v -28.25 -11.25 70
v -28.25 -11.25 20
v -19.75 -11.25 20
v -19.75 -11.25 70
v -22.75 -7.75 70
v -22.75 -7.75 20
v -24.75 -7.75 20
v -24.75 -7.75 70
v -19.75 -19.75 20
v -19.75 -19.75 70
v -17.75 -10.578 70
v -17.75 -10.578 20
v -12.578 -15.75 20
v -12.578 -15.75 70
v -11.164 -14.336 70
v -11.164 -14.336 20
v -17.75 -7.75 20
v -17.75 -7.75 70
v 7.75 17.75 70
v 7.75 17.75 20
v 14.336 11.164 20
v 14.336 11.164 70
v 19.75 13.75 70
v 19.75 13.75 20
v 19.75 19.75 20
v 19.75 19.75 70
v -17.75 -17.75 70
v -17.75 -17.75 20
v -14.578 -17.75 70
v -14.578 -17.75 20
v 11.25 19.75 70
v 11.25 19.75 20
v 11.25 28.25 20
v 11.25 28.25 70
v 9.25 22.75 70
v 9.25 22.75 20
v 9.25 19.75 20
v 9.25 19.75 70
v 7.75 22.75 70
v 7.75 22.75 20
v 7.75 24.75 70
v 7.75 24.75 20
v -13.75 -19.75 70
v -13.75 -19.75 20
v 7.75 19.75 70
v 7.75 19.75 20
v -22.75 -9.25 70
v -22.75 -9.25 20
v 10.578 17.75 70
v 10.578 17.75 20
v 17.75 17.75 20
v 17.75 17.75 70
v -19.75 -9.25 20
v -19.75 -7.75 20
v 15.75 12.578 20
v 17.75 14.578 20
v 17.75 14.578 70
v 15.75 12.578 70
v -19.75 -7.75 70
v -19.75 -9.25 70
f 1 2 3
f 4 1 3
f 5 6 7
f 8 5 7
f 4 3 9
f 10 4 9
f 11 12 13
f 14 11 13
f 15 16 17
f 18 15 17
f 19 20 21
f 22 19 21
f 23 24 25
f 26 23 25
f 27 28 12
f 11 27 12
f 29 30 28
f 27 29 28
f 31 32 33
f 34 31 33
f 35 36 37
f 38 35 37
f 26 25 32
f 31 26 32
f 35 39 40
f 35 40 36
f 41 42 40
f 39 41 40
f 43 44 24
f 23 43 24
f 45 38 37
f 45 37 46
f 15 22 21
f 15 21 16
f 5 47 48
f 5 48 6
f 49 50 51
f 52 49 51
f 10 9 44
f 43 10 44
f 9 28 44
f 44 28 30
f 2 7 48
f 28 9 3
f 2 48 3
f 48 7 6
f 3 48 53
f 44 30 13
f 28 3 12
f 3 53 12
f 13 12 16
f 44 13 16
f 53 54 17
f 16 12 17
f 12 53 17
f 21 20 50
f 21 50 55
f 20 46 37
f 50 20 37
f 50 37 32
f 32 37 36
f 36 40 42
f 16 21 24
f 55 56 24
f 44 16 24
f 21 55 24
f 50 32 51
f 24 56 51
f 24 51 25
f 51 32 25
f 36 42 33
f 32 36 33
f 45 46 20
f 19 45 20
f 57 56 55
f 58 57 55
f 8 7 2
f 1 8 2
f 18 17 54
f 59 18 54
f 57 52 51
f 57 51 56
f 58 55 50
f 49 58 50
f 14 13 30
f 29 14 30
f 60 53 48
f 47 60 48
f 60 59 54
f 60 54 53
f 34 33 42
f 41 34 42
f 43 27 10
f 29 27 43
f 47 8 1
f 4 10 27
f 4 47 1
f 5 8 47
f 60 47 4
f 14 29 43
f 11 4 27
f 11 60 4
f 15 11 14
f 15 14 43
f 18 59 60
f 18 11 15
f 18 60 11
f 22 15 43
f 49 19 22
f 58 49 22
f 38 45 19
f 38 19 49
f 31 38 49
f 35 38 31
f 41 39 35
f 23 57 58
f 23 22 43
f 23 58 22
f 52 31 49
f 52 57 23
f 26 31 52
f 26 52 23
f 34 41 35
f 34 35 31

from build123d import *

# Parameters (mm, degrees)
F1_DEPTH = 20
F3_DEPTH = 50
F5_DEPTH = 20


with BuildPart() as f1:
    # F0 (on Top) → F1 (new body)
    with BuildSketch(Plane.XY):
        Polygon((-19.75, -17.7500005811), (-19.75, -19.75), (-13.75, -19.75), (19.75, 13.75), (19.75, 19.75), (17.7500005811, 19.75), (17.7500005811, 14.578426884), (-14.578426884, -17.7500005811), align=None)
    extrude(amount=F1_DEPTH)

    # F2 (on face) → F3 (join)
    with BuildSketch(Plane.XY.offset(20)):
        Polygon((-19.75, -19.75), (-13.75, -19.75), (19.75, 13.75), (19.75, 19.75), (11.25, 19.75), (11.25, 28.25), (7.75, 24.75), (7.75, 22.75), (9.25, 22.75), (9.25, 19.7500005811), (7.75, 19.7500005811), (7.75, 17.7500005811), (14.3357871391, 11.164213442), (-11.164213442, -14.3357871391), (-17.7500005811, -7.75), (-19.7500005811, -7.75), (-19.7500005811, -9.25), (-22.75, -9.25), (-22.75, -7.75), (-24.75, -7.75), (-28.25, -11.25), (-19.75, -11.25), align=None)
        Polygon((-14.578426884, -17.7500005811), (-17.7500005811, -17.7500005811), (-17.7500005811, -10.5784263029), (-12.5784265935, -15.7500002906), align=None, mode=Mode.SUBTRACT)
        Polygon((10.5784263029, 17.7500005811), (17.7500005811, 17.7500005811), (17.7500005811, 14.578426884), (15.7500002906, 12.5784265935), align=None, mode=Mode.SUBTRACT)
    extrude(amount=F3_DEPTH)

    # F5 (cut, through all): a face of the model
    f5_faces = [f1.faces().sort_by_distance(p)[0] for p in [
        (2.0288816122, -2.0288816122, 0),
    ]]
    extrude(f5_faces, amount=-F5_DEPTH, mode=Mode.SUBTRACT)


solid = f1.part
